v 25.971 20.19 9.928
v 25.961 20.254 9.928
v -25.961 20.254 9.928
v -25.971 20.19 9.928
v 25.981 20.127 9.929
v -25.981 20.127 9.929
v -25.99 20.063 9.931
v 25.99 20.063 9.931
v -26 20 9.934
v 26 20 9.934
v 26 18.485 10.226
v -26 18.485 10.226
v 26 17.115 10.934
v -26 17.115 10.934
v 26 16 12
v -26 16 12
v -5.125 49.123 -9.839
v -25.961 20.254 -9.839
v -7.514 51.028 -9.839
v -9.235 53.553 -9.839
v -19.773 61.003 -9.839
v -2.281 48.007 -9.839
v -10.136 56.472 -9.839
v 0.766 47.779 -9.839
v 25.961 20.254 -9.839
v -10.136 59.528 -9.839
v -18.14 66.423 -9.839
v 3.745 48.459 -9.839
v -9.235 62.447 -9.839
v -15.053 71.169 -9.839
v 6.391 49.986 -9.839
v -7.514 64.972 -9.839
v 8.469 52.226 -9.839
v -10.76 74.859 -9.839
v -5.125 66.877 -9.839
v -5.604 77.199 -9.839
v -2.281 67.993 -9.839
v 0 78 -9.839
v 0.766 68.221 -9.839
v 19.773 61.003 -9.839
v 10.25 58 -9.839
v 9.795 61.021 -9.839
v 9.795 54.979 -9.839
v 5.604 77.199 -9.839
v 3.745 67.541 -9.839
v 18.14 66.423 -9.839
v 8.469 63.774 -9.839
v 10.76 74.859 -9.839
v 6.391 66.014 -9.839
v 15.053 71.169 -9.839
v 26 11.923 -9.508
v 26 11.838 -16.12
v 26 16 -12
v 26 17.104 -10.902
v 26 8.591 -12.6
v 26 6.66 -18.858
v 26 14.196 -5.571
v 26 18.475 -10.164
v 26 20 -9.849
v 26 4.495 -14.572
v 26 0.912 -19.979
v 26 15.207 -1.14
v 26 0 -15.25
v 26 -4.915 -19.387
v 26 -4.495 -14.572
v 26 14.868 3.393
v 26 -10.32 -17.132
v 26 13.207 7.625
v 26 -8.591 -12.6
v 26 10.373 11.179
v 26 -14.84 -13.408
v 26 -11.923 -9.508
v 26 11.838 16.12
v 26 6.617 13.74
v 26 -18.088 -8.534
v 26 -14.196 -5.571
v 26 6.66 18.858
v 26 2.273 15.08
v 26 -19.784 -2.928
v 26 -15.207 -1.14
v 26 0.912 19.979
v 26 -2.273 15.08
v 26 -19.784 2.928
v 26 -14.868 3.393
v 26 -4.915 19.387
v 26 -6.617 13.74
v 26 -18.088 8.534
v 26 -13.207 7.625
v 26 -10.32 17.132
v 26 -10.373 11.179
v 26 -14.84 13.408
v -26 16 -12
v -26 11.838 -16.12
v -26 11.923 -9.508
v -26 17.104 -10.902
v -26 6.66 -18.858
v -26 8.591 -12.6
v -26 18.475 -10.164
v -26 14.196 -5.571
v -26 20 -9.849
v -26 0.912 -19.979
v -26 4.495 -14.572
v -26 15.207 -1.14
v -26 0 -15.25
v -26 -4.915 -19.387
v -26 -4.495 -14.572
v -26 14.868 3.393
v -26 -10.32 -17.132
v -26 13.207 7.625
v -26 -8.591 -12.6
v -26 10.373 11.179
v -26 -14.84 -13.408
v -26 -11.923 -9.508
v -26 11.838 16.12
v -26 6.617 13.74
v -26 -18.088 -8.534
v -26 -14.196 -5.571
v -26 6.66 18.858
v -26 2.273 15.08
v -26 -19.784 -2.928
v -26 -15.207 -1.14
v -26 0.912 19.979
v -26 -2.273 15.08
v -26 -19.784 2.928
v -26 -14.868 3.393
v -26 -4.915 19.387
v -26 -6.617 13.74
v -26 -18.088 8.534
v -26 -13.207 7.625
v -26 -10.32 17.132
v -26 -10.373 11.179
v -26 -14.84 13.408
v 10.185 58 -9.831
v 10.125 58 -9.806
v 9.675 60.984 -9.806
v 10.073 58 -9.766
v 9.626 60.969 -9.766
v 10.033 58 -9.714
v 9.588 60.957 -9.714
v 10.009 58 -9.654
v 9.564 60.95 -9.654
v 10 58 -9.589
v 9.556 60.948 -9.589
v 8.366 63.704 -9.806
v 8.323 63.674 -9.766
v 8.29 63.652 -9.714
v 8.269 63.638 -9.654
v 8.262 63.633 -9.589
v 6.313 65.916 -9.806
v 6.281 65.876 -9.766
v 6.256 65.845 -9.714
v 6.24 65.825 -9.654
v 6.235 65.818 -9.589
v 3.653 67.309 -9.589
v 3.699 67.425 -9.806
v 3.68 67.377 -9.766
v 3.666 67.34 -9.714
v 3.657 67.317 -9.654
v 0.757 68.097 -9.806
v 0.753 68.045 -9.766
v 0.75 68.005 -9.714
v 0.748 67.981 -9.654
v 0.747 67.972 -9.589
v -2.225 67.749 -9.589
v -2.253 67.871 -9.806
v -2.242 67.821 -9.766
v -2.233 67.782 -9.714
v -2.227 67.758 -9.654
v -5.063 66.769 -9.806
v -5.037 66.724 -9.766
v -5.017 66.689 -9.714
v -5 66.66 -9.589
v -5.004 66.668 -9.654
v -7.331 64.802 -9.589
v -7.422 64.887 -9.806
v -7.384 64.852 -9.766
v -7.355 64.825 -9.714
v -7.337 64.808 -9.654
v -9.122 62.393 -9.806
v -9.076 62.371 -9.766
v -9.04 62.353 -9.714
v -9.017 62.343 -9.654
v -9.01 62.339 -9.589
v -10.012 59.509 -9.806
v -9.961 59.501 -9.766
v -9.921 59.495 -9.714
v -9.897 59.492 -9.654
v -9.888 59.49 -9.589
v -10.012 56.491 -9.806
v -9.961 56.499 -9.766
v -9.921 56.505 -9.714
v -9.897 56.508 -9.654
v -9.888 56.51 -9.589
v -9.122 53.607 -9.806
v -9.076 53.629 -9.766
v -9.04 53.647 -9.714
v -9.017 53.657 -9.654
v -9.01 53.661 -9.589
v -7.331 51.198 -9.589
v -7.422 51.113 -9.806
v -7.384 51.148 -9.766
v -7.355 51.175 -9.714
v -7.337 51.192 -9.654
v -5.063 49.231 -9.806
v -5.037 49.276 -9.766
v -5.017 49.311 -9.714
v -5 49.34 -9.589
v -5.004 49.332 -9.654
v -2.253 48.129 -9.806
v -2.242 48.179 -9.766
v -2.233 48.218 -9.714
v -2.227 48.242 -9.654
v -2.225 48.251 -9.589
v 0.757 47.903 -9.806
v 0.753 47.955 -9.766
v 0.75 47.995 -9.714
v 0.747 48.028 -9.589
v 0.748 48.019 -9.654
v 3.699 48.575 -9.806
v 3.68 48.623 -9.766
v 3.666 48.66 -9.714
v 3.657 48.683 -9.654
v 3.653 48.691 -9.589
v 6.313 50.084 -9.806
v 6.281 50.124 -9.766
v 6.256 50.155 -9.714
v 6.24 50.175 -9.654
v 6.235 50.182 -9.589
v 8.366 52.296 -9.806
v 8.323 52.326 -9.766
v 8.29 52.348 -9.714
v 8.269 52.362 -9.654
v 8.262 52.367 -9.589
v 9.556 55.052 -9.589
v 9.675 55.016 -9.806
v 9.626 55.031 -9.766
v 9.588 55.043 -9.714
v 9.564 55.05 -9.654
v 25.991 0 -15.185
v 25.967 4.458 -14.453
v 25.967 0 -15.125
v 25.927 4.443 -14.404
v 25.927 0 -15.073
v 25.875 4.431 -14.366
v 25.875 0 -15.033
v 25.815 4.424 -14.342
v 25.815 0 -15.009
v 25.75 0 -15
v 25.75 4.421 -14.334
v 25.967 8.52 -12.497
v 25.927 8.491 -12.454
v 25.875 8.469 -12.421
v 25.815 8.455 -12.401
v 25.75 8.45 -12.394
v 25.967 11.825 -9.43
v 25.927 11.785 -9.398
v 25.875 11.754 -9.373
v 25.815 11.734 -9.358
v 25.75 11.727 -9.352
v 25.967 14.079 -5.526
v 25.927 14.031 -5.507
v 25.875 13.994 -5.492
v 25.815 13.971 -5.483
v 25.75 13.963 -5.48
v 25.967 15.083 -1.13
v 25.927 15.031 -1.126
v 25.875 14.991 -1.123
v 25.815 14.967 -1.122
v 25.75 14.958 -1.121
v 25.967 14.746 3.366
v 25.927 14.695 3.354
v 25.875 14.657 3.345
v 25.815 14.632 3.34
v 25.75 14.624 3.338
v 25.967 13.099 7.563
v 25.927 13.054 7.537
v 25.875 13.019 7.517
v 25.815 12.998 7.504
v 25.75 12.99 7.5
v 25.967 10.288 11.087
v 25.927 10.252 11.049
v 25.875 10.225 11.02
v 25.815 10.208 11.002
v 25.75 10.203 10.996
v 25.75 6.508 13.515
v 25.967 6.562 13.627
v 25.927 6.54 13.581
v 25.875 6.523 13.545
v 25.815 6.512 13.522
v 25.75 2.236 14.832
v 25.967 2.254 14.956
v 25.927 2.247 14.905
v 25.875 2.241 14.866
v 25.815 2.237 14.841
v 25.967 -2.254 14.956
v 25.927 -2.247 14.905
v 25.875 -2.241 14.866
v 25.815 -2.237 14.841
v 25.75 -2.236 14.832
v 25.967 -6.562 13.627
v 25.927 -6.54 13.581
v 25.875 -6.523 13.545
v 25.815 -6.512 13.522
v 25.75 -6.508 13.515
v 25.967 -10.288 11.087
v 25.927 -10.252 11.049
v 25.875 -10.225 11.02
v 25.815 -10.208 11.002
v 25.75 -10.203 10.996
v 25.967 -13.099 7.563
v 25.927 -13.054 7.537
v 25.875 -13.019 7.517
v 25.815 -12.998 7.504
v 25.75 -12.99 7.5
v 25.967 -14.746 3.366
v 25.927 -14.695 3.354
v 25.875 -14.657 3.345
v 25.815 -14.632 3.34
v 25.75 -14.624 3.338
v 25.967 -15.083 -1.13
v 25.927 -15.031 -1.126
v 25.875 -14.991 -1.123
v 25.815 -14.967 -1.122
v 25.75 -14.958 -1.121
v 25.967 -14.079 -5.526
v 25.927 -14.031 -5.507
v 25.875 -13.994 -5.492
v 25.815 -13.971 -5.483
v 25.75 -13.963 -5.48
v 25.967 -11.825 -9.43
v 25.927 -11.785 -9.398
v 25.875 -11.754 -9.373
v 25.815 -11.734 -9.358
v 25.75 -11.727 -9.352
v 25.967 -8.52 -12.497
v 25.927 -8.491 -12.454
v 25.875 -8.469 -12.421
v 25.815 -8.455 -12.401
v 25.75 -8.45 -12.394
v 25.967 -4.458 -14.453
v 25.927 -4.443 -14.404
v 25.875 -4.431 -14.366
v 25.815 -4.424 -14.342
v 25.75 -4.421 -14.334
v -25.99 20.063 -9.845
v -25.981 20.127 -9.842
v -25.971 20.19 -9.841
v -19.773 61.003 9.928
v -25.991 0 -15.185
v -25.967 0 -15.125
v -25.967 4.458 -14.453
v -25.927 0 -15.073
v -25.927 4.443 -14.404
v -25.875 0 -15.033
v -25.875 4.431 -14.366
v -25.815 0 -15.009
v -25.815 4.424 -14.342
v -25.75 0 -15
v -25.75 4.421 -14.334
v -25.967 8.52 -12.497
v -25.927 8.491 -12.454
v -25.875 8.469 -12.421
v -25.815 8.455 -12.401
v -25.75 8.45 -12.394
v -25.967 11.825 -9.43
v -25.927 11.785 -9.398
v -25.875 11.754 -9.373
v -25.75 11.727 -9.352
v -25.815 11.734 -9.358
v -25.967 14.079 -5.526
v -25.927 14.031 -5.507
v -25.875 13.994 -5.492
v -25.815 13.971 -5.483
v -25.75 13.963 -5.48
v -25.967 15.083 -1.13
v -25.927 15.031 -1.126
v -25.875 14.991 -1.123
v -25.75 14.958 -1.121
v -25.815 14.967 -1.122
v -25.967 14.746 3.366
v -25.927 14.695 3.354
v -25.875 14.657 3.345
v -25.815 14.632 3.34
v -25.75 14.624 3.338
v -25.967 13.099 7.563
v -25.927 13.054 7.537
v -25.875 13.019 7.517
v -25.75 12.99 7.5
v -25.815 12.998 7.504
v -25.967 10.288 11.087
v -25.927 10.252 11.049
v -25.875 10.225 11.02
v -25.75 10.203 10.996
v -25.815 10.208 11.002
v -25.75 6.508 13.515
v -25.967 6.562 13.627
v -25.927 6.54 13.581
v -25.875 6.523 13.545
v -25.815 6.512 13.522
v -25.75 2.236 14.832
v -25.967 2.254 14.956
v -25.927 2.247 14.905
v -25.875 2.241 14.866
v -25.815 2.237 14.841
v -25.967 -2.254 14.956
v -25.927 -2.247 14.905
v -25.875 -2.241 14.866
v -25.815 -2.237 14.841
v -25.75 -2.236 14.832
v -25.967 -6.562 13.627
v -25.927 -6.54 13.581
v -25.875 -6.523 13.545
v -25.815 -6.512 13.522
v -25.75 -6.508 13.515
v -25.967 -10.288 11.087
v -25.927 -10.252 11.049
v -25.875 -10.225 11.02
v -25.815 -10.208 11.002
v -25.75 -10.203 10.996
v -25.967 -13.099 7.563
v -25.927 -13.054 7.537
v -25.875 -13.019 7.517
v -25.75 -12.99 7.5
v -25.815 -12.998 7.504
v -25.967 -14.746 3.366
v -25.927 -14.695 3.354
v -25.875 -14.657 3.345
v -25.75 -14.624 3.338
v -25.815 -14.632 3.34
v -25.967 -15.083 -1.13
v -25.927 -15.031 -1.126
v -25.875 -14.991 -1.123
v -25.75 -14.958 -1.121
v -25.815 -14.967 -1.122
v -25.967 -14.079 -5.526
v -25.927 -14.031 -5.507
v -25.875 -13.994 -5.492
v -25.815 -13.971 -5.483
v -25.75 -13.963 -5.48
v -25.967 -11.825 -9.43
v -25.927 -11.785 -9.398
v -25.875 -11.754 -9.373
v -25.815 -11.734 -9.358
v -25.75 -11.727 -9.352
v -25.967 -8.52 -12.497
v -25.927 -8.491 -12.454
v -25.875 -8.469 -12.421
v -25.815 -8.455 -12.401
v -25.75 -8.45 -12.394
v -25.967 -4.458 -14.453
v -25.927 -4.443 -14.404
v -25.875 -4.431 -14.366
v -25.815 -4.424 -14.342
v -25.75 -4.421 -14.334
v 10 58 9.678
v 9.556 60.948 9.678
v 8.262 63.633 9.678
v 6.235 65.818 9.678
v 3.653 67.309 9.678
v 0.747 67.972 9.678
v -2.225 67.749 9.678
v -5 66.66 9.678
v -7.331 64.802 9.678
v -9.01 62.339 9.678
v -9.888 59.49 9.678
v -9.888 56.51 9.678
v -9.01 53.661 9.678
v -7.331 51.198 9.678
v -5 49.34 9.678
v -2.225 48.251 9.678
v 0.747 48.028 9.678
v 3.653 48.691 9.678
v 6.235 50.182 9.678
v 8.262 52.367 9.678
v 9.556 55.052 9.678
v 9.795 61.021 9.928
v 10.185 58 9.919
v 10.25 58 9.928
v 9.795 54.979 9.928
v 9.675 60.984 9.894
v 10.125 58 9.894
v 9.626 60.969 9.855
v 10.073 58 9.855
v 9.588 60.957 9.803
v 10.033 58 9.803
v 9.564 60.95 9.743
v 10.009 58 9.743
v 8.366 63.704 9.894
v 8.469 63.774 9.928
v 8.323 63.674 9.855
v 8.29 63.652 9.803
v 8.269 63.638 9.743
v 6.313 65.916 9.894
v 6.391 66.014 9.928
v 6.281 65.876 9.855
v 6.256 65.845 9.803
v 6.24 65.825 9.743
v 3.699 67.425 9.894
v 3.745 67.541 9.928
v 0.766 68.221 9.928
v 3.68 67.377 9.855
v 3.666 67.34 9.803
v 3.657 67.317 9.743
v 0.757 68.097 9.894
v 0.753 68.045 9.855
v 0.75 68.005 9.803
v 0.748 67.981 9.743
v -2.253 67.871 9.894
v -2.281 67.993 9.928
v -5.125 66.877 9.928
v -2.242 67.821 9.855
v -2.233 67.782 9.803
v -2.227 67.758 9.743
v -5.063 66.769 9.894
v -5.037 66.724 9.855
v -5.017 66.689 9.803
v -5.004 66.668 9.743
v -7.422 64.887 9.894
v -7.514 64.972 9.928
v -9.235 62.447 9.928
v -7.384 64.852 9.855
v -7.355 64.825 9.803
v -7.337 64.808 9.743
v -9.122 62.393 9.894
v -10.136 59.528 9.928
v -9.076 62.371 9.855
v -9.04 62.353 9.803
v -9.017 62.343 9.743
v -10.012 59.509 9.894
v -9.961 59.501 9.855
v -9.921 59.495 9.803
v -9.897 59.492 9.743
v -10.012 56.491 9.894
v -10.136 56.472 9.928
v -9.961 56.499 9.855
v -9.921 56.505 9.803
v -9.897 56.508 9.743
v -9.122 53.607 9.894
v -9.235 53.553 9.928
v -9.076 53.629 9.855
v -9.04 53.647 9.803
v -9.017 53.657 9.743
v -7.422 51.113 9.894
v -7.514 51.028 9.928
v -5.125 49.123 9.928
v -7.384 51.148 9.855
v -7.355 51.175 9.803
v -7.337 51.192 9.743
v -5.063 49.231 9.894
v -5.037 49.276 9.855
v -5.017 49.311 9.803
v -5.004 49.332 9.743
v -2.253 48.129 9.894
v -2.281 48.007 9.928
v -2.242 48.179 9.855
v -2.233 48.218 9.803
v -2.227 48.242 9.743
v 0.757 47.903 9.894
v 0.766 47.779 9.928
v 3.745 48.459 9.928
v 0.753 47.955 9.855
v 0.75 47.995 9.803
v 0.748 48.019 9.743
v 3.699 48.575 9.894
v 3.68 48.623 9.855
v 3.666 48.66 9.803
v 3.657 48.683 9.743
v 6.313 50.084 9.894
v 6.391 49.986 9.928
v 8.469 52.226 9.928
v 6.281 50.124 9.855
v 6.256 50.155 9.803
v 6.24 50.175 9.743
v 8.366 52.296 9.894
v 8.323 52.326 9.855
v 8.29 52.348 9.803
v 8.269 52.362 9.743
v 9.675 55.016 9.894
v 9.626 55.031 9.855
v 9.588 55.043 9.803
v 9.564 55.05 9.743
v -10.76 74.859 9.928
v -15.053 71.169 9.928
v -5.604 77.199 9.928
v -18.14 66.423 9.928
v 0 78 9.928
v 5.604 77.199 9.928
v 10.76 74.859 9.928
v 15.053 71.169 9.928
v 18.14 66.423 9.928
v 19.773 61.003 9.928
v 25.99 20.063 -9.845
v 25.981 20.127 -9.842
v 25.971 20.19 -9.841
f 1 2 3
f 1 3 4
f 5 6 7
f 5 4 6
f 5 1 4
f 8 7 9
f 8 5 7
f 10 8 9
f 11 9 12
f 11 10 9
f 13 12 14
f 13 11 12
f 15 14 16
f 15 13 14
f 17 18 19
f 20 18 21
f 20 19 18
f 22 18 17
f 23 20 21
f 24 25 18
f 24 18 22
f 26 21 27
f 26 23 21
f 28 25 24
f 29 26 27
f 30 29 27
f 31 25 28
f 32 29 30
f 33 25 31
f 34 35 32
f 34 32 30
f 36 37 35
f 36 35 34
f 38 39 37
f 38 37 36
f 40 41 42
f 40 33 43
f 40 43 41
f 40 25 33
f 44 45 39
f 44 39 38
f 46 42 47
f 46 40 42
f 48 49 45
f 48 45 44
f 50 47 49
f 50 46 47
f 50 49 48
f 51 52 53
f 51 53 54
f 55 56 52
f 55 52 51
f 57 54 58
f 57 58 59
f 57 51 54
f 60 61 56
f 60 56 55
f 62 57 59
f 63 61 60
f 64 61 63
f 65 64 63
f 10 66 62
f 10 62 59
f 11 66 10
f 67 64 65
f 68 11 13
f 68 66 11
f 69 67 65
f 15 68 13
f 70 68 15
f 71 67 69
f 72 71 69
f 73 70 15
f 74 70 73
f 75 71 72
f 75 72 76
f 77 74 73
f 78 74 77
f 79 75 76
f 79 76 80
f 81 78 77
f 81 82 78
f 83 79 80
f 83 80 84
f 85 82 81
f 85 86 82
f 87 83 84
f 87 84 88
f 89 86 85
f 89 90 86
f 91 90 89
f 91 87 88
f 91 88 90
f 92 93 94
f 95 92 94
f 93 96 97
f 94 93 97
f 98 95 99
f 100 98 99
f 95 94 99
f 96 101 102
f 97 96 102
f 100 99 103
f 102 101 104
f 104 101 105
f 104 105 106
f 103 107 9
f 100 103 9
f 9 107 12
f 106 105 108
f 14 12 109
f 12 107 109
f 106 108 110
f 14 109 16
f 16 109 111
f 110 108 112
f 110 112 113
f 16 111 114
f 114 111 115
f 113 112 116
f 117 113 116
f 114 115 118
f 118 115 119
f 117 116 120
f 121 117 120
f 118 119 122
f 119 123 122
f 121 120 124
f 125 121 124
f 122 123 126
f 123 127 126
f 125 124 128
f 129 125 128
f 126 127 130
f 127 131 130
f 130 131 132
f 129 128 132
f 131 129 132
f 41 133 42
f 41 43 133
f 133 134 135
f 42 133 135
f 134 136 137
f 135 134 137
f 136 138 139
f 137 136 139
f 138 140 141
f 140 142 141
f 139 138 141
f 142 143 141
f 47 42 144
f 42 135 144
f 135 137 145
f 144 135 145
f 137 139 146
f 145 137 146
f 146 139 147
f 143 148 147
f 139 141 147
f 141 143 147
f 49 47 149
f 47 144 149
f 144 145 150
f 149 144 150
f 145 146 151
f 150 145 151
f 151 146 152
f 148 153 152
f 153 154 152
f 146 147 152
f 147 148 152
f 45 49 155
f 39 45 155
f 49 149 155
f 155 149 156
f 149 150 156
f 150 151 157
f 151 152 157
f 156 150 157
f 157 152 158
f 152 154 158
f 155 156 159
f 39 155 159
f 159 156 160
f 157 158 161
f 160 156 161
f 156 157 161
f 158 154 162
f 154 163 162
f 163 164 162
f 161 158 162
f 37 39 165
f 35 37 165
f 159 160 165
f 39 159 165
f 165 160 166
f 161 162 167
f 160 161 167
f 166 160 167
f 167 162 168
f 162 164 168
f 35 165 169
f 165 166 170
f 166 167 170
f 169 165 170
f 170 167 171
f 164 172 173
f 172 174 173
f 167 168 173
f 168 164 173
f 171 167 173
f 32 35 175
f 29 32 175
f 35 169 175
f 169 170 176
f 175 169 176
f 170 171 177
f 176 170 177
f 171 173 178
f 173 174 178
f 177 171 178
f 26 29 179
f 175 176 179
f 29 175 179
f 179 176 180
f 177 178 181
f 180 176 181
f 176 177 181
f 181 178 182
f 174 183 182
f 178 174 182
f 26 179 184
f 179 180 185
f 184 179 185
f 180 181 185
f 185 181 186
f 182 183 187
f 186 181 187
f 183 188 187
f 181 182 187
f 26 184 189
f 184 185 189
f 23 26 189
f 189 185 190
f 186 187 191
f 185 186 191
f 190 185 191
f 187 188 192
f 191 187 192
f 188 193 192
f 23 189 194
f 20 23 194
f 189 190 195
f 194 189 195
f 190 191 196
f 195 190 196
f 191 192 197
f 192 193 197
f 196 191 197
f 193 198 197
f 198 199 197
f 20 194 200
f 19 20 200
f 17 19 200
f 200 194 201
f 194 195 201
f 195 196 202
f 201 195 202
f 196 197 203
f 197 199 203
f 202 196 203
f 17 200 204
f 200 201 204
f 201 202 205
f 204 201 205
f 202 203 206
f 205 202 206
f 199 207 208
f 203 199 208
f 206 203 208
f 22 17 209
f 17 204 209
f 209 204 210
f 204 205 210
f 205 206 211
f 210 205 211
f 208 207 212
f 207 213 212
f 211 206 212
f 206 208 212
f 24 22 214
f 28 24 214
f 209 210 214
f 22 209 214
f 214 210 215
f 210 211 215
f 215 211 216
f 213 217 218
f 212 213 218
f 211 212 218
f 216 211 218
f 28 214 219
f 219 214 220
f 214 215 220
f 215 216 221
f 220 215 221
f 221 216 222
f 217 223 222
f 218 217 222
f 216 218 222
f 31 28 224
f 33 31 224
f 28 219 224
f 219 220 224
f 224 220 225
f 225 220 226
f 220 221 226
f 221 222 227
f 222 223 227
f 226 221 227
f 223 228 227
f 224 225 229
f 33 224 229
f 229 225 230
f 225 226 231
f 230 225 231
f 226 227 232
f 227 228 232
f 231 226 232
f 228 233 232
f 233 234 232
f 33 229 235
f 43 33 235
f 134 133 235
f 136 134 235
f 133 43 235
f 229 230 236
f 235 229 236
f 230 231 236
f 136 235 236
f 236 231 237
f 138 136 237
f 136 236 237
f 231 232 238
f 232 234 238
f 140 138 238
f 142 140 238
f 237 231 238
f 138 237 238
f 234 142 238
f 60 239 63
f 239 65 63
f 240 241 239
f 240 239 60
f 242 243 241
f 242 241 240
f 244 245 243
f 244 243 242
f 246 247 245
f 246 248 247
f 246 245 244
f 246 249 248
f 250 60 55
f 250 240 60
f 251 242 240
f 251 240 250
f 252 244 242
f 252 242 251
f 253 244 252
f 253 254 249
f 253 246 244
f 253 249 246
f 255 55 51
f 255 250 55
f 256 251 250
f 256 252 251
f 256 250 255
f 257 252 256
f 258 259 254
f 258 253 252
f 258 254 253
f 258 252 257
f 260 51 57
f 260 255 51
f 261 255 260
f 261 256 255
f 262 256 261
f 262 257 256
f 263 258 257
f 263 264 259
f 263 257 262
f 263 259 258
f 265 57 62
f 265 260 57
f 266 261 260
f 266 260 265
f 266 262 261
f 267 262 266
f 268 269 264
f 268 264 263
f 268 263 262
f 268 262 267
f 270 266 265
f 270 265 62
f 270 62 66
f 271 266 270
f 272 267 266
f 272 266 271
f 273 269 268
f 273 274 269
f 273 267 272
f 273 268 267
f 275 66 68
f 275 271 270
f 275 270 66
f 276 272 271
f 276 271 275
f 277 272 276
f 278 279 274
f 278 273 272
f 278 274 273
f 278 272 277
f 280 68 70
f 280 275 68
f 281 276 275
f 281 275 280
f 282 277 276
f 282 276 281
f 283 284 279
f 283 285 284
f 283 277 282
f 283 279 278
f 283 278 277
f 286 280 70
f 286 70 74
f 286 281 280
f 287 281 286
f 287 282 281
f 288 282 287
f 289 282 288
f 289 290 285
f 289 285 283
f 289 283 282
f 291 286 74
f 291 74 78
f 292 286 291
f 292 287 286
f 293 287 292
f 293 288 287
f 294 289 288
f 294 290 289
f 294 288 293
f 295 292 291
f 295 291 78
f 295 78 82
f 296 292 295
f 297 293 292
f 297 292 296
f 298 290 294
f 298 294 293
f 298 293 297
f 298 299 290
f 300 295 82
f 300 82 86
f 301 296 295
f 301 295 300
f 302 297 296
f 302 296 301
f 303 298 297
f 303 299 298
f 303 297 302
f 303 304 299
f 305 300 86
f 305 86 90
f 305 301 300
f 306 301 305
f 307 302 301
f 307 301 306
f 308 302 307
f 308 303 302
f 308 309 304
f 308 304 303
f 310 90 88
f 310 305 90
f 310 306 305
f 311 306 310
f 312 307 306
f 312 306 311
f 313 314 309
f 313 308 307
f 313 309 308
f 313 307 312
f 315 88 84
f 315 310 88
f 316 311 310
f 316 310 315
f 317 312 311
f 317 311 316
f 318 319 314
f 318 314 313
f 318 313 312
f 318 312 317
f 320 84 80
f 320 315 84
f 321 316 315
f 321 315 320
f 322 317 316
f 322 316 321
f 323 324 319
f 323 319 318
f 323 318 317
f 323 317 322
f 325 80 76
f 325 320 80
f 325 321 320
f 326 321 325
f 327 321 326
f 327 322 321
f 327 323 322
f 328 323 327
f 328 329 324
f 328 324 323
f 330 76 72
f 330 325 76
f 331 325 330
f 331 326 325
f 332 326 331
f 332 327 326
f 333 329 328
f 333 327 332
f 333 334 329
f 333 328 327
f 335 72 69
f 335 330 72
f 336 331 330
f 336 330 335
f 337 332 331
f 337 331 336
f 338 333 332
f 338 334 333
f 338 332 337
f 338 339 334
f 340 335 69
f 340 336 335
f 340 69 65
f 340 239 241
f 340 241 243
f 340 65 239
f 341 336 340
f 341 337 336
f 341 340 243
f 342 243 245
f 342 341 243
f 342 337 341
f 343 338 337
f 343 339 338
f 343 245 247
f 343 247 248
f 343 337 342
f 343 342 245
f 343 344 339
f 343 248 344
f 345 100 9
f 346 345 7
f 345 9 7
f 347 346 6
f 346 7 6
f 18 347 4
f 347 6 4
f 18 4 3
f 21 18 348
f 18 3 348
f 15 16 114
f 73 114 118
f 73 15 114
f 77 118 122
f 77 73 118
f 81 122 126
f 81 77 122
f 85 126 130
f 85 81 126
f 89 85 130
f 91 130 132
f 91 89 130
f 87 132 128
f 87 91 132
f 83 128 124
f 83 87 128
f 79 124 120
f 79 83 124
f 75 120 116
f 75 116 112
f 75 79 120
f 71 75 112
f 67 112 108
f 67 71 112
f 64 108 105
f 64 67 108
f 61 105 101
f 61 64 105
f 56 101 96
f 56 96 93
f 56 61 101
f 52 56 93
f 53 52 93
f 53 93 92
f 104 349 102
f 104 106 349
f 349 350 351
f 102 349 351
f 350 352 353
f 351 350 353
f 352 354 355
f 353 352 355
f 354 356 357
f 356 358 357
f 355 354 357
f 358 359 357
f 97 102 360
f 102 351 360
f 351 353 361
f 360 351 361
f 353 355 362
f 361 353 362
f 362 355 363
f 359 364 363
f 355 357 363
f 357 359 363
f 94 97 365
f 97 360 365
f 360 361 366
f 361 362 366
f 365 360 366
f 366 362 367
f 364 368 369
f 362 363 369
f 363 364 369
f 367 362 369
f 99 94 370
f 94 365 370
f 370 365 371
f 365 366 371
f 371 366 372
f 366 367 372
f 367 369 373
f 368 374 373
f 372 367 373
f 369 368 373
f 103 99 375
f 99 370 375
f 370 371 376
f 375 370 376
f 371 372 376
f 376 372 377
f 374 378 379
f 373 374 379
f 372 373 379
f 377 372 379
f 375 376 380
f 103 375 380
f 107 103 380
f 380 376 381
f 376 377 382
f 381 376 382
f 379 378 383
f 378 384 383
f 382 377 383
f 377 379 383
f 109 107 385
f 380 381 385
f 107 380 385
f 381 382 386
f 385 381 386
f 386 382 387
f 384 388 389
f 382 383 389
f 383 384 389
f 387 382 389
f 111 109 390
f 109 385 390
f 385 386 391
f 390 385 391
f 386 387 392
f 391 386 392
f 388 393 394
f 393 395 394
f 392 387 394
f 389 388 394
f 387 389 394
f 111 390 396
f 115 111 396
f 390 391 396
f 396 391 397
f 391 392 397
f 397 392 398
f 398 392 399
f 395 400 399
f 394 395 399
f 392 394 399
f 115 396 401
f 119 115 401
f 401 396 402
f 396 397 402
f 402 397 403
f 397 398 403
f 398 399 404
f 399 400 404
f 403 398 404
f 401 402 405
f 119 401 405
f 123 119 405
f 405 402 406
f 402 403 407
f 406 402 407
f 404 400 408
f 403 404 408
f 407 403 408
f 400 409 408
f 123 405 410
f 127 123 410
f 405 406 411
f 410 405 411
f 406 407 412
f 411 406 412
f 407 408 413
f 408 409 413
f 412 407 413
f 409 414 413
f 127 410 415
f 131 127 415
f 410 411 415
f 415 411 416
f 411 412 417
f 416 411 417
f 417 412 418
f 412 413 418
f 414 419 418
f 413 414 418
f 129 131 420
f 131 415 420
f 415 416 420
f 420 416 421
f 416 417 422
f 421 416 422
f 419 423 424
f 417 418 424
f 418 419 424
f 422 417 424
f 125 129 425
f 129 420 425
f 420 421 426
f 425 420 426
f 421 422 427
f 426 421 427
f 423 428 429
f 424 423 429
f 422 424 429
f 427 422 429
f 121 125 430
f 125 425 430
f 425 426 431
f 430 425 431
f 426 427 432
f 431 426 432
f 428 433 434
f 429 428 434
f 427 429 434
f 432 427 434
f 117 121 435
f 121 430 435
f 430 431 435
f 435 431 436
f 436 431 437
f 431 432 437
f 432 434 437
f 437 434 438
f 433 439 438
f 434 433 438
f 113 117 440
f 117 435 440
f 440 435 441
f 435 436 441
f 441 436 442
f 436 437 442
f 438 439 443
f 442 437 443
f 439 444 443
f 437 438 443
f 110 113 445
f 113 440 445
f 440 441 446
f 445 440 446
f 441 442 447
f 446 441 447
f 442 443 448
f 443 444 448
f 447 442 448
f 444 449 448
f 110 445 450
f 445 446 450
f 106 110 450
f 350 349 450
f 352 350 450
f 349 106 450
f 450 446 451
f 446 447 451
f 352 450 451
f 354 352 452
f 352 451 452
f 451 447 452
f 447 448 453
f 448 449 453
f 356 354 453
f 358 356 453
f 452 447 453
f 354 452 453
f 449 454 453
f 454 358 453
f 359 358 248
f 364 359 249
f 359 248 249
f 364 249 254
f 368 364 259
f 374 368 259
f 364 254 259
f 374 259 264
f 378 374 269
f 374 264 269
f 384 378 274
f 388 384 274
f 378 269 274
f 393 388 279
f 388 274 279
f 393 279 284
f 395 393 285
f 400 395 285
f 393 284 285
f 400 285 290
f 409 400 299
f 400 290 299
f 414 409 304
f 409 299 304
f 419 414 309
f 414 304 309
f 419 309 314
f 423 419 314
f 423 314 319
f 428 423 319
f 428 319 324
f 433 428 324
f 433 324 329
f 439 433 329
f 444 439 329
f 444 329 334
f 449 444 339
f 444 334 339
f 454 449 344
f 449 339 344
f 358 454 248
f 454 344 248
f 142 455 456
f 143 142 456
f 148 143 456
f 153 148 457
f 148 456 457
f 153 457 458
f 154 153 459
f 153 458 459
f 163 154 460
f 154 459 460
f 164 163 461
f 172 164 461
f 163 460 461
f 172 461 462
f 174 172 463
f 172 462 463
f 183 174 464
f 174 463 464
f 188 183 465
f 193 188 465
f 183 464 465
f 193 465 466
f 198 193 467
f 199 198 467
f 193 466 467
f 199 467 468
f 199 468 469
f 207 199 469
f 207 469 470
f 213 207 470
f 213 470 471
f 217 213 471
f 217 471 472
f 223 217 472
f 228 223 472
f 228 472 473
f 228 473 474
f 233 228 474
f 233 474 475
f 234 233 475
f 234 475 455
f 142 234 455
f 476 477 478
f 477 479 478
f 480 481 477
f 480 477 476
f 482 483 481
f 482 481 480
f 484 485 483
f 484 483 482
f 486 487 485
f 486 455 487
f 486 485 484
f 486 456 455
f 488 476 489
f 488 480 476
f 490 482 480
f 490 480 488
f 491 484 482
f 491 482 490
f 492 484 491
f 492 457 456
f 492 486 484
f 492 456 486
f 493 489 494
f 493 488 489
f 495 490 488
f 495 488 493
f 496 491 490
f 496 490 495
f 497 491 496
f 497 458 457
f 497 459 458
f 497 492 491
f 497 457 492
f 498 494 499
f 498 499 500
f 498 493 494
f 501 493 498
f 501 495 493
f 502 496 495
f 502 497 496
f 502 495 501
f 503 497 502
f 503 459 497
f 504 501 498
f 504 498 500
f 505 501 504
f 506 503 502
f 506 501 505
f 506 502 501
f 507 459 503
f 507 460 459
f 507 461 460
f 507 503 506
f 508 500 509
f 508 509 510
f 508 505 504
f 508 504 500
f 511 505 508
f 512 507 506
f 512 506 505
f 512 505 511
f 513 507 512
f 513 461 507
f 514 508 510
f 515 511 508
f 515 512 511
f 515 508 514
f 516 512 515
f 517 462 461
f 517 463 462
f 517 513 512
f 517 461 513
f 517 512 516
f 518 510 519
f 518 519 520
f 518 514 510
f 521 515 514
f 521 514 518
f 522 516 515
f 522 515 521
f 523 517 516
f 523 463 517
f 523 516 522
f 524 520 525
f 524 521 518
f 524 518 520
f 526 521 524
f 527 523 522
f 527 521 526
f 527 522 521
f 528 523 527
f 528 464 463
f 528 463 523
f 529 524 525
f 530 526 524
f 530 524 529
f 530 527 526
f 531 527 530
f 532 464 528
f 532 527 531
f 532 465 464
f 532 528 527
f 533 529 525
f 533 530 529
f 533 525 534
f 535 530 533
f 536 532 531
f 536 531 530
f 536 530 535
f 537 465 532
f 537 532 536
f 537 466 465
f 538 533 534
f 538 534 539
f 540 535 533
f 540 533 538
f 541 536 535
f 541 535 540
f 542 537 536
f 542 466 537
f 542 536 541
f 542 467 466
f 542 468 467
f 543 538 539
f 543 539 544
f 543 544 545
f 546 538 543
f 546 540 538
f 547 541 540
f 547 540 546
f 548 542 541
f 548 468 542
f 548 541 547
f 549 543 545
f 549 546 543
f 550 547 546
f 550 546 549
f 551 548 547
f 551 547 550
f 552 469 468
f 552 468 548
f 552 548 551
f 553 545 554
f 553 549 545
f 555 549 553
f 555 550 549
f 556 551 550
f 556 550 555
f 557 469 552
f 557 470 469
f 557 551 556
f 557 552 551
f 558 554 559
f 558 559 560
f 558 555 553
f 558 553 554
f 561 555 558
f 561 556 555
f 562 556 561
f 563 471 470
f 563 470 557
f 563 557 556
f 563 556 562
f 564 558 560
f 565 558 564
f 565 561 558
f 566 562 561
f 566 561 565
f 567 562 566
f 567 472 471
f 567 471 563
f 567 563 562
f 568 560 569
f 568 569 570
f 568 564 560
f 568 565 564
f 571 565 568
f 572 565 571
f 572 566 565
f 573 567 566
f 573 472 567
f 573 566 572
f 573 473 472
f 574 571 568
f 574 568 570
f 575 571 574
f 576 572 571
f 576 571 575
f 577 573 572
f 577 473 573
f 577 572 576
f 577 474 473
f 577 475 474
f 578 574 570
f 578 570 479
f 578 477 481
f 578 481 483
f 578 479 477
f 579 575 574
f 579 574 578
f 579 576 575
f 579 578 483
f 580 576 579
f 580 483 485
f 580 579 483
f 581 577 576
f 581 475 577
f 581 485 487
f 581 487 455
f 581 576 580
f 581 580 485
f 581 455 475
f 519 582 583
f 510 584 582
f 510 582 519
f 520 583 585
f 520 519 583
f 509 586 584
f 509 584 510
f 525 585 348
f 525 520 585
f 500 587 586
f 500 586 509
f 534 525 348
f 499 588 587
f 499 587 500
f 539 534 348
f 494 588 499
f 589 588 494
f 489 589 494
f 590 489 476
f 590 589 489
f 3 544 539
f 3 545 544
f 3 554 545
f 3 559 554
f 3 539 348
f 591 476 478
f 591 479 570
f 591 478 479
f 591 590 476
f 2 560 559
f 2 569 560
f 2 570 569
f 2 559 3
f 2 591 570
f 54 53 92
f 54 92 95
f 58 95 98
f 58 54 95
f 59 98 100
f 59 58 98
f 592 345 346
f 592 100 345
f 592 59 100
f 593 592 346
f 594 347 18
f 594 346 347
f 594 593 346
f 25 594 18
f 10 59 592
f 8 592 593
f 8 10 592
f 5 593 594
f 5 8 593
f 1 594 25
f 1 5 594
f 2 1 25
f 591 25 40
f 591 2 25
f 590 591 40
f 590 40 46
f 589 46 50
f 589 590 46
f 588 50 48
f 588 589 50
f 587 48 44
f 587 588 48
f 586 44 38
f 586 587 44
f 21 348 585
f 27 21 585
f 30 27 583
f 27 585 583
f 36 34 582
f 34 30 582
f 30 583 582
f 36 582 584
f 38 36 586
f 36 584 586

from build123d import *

# Parameters (mm, degrees)
SKETCH1_R           = 20
BOSS_EXTRUDE1_DEPTH = 26
BOSS_EXTRUDE2_START = -52
BOSS_EXTRUDE2_DEPTH = 52
CUT_EXTRUDE2_DEPTH  = 26
SKETCH7_R           = 10
CUT_EXTRUDE3_DEPTH  = 52
SKETCH8_R           = 15
CUT_EXTRUDE4_DEPTH  = 52
FILLET1_R           = 0.25


with BuildPart() as part:
    # Sketch1 → Boss-Extrude1 (new, symmetric)
    with BuildSketch(Plane(origin=(0, 0, 0), x_dir=(0, 0, -1), z_dir=(1, 0, 0))):
        with Locations(Location((0, 0, 0), (0, 0, 180))):
            Circle(SKETCH1_R)
    extrude(amount=BOSS_EXTRUDE1_DEPTH, both=True)

    # Sketch4 → Boss-Extrude2 (add)
    with BuildSketch(Plane.ZY.offset(26).offset(BOSS_EXTRUDE2_START)):
        with BuildLine():
            Line((-9.839336332, 20.254001388), (-9.839336332, 78))
            Line((-9.839336332, 78), (9.927883161, 78))
            Line((9.927883161, 78), (9.927883161, 20.254001388))
            ThreePointArc((9.927883161, 20.254001388), (10.473458868, 17.8880874), (12, 16))
            ThreePointArc((12, 16), (0, 20), (-12, 16))
            ThreePointArc((-12, 16), (-10.424631432, 17.875564978), (-9.839336332, 20.254001388))
        make_face()
    extrude(amount=BOSS_EXTRUDE2_DEPTH)

    # Sketch3 → Cut-Extrude2 (cut, symmetric)
    with BuildSketch(Plane.XY):
        with BuildLine():
            Line((-26, 20), (-19.773297574, 61.002782551))
            ThreePointArc((-19.773297574, 61.002782551), (-13.037337707, 73.16666824), (0, 78))
            Line((0, 78), (-26, 78))
            Line((-26, 78), (-26, 20))
        make_face()
    cut_extrude2 = extrude(amount=CUT_EXTRUDE2_DEPTH, both=True, mode=Mode.SUBTRACT)

    # Mirror1: Cut-Extrude2 across plane
    add(cut_extrude2.mirror(Plane(origin=(0, 0, 0), x_dir=(0, 0, 1), z_dir=(1, 0, 0))), mode=Mode.SUBTRACT)

    # Sketch7 → Cut-Extrude3 (cut)
    with BuildSketch(Plane.XY.offset(9.927883161)):
        with Locations((0, 58)):
            Circle(SKETCH7_R)
    extrude(amount=-CUT_EXTRUDE3_DEPTH, mode=Mode.SUBTRACT)

    # Sketch8 → Cut-Extrude4 (cut)
    with BuildSketch(Plane(origin=(26, 0, 0), x_dir=(0, 0, -1), z_dir=(1, 0, 0))):
        Circle(SKETCH8_R)
    extrude(amount=-CUT_EXTRUDE4_DEPTH, mode=Mode.SUBTRACT)

    # Fillet1
    fillet1_edges = [part.edges().sort_by_distance(p)[0] for p in [
        (-10, 58, -9.839336332),
        (-10, 58, 9.927883161),
        (-26, 0, 15),
        (26, 0, 15),
    ]]
    fillet(fillet1_edges, radius=FILLET1_R)


solid = part.part
